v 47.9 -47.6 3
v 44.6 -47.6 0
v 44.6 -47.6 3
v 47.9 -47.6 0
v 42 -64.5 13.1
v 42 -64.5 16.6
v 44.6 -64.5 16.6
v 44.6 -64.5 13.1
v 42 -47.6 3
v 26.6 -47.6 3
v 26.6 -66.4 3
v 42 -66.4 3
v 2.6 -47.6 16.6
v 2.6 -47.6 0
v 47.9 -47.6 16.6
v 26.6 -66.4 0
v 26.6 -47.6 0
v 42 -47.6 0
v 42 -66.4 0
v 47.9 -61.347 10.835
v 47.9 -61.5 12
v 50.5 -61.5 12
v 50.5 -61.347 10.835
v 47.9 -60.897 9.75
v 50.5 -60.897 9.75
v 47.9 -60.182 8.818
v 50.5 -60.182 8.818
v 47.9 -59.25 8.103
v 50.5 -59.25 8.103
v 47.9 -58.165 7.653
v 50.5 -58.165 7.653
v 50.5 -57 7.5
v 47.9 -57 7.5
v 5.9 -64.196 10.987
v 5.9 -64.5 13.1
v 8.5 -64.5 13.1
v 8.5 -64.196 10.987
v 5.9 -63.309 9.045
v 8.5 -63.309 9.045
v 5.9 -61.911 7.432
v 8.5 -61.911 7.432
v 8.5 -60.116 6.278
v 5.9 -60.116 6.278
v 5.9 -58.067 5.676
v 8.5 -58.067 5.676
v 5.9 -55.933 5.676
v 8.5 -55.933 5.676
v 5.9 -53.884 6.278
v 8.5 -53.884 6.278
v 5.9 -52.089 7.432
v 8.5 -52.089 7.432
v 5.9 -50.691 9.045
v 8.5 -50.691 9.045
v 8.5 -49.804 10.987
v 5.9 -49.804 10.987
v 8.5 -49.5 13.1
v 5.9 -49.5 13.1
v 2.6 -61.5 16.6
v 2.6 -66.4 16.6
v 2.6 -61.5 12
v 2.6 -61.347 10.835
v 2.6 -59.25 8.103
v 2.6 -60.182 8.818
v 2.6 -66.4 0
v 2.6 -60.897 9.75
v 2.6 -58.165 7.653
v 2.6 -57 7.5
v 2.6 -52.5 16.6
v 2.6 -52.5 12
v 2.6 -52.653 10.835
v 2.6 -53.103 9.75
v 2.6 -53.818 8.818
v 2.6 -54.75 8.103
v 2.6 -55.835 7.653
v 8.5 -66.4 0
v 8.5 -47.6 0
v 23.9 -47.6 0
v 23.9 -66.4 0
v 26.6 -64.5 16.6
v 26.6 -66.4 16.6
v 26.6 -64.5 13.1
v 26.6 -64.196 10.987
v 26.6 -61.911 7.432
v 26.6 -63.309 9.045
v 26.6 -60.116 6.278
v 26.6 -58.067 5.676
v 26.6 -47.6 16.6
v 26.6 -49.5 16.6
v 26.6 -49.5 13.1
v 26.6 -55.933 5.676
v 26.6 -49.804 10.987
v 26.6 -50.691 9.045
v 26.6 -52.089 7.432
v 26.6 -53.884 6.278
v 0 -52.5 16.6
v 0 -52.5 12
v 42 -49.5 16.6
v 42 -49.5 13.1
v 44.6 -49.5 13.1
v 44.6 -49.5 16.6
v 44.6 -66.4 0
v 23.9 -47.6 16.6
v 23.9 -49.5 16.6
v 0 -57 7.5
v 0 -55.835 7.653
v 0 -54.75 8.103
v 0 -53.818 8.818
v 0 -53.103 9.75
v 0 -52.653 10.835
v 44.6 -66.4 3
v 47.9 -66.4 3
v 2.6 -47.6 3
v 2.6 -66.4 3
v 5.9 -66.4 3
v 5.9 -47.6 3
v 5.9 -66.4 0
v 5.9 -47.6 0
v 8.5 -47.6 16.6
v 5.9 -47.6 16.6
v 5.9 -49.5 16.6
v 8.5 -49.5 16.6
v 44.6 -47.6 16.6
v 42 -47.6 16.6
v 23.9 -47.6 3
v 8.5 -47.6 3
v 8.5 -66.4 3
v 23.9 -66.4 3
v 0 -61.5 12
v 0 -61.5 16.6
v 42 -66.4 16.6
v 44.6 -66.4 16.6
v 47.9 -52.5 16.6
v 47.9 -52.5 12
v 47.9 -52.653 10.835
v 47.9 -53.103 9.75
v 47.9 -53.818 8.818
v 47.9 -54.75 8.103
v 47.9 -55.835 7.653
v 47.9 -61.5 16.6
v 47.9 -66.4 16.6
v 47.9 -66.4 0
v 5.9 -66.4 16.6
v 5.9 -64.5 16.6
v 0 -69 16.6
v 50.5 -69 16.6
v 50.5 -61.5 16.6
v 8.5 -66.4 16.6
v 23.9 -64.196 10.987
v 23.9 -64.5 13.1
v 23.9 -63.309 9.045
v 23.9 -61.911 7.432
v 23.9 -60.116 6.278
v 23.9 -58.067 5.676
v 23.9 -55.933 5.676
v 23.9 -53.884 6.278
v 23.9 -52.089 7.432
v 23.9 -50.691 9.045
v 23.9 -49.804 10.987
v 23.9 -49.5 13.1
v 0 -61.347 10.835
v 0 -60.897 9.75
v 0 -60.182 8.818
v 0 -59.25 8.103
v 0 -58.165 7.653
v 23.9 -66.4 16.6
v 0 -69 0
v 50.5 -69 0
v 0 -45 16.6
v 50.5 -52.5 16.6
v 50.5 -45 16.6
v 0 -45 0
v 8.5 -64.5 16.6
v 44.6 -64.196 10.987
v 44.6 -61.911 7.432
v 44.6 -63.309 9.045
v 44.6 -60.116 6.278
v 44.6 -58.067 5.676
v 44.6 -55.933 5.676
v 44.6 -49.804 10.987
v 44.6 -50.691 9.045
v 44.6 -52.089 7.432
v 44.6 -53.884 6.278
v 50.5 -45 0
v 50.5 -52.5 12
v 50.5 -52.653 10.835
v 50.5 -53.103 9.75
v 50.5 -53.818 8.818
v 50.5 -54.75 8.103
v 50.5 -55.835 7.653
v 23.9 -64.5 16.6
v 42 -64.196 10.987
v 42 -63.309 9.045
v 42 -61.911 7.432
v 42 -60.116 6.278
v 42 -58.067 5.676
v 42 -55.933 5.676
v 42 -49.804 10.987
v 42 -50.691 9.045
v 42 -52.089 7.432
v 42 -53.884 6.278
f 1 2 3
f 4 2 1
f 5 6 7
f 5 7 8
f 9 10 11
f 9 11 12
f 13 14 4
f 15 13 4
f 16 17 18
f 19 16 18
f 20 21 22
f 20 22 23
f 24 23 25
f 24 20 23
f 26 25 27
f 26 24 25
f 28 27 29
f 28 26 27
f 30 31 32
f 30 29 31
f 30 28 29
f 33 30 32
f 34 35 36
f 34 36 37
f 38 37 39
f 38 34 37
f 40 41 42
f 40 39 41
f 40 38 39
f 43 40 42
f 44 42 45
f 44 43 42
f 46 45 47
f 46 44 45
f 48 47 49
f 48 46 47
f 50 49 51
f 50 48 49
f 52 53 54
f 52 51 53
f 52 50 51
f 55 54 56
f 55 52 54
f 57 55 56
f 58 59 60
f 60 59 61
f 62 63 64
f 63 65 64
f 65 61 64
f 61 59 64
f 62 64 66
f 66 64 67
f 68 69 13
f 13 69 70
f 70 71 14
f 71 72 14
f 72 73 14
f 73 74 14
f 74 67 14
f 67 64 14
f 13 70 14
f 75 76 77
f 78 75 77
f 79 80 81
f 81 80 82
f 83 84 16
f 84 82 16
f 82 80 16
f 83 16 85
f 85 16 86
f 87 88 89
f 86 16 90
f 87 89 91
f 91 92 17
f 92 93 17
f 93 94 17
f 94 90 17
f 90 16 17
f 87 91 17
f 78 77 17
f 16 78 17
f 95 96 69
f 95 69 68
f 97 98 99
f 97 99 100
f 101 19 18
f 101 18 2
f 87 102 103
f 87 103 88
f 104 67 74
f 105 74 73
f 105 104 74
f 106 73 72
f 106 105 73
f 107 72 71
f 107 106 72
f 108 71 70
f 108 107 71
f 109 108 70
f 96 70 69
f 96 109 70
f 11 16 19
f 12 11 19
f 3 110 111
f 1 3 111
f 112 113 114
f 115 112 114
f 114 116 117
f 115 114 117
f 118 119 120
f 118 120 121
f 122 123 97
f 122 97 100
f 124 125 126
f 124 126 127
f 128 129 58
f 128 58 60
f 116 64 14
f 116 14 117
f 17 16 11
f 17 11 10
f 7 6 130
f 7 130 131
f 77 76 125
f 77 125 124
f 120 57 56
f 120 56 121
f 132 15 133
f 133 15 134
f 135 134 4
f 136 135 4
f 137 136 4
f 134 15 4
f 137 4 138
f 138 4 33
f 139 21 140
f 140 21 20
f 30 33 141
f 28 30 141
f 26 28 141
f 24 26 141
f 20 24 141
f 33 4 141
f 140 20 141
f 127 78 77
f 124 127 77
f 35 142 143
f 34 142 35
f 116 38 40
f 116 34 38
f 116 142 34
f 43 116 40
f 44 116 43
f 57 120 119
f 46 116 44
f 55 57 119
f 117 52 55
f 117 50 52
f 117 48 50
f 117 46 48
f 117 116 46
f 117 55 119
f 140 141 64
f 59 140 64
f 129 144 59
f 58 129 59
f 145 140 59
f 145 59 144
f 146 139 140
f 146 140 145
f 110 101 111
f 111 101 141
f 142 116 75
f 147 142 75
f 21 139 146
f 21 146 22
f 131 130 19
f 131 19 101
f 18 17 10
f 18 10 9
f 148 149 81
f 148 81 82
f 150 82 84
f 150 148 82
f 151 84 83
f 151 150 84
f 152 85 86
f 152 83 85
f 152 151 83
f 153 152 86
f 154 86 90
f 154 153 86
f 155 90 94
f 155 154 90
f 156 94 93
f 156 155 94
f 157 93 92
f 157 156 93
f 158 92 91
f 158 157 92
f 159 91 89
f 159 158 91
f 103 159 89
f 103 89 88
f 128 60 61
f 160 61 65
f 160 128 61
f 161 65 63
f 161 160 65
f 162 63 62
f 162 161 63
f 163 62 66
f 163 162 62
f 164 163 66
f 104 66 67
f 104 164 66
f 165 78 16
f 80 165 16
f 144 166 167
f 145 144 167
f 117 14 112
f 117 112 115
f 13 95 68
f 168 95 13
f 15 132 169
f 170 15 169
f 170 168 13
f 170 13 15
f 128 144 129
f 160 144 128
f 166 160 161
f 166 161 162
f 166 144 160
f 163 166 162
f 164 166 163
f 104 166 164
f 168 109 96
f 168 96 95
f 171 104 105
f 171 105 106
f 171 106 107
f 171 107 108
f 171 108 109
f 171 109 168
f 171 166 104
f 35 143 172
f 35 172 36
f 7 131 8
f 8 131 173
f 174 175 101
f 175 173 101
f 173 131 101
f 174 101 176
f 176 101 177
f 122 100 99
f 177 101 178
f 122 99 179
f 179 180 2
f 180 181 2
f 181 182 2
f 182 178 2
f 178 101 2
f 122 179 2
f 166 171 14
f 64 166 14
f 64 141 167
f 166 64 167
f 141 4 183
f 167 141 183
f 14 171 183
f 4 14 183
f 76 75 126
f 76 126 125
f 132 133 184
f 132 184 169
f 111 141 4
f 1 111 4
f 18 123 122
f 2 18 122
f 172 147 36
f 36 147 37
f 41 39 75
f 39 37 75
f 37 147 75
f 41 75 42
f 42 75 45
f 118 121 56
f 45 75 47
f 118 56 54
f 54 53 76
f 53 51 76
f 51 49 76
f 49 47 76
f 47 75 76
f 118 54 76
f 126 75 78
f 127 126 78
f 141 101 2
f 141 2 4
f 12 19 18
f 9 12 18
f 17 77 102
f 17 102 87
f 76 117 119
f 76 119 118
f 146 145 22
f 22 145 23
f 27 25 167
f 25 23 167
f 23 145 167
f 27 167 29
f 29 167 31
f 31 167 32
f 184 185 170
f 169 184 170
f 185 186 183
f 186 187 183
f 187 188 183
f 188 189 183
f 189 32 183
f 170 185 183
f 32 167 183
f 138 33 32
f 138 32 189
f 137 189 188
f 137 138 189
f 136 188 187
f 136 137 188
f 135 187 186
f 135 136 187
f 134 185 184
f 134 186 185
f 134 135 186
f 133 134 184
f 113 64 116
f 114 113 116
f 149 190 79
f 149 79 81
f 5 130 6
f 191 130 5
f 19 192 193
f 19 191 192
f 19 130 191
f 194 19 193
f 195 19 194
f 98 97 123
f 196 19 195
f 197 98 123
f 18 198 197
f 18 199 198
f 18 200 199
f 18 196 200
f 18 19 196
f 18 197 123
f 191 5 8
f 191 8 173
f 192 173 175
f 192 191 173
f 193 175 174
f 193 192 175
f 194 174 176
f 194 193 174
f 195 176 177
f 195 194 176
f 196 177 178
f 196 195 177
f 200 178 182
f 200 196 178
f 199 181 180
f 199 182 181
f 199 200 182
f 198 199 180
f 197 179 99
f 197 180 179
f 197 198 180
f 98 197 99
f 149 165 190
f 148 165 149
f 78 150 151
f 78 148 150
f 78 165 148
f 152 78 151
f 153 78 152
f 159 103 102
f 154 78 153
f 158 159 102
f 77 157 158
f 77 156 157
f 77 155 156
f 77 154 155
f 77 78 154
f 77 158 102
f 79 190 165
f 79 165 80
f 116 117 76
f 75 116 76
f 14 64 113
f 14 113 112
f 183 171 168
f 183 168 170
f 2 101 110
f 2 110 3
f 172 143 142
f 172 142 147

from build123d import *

# Parameters (mm, degrees)
F0_W     = 3.3
F0_H     = 18.8
F1_DEPTH = 3
F0_W_2   = 15.4
F0_W_3   = 2.6
F2_DEPTH = 16.6
F0_W_4   = 2.7
F4_DEPTH = 47.901
F0_W_5   = 50.5
F0_H_2   = 24
F5_DEPTH = 16.6
F6_DEPTH = 50.501


with BuildPart() as f1:
    # F0 (on Top) → F1 (new body)
    with BuildSketch(Plane.XY):
        with Locations((4.25, -57)):
            Rectangle(F0_W, F0_H)
    extrude(amount=F1_DEPTH)


with BuildPart() as f1b:
    # F0 (on Top) → F1, piece 2 (new body)
    with BuildSketch(Plane.XY):
        with Locations((16.2, -57)):
            Rectangle(F0_W_2, F0_H)
    extrude(amount=F1_DEPTH)


with BuildPart() as f1c:
    # F0 (on Top) → F1, piece 3 (new body)
    with BuildSketch(Plane.XY):
        with Locations((34.3, -57)):
            Rectangle(F0_W_2, F0_H)
    extrude(amount=F1_DEPTH)


with BuildPart() as f1d:
    # F0 (on Top) → F1, piece 4 (new body)
    with BuildSketch(Plane.XY):
        with Locations((46.25, -57)):
            Rectangle(F0_W, F0_H)
    extrude(amount=F1_DEPTH)


with BuildPart() as f2:
    # F0 (on Top) → F2 (new body)
    with BuildSketch(Plane.XY):
        with Locations((43.3, -57)):
            Rectangle(F0_W_3, F0_H)
    extrude(amount=F2_DEPTH)


with BuildPart() as f2b:
    # F0 (on Top) → F2, piece 2 (new body)
    with BuildSketch(Plane.XY):
        with Locations((25.25, -57)):
            Rectangle(F0_W_4, F0_H)
    extrude(amount=F2_DEPTH)


with BuildPart() as f2c:
    # F0 (on Top) → F2, piece 3 (new body)
    with BuildSketch(Plane.XY):
        with Locations((7.2, -57)):
            Rectangle(F0_W_3, F0_H)
    extrude(amount=F2_DEPTH)


with BuildPart() as f4_tool:
    # F3 (on Right) → F4 (new body, through all)
    with BuildSketch(Plane.YZ):
        with BuildLine():
            Line((-64.5, 16.6), (-64.5, 13.1))
            ThreePointArc((-64.5, 13.1), (-64.2800883187, 14.9028627436), (-63.6332495807, 16.6))
            Line((-63.6332495807, 16.6), (-64.5, 16.6))
        make_face()
        with BuildLine():
            ThreePointArc((-64.5, 13.1), (-62.3033008589, 7.7966991411), (-57, 5.6))
            Line((-57, 5.6), (-57, 7.5))
            ThreePointArc((-57, 7.5), (-60.1819805153, 8.8180194847), (-61.5, 12))
            Line((-61.5, 12), (-61.5, 16.6))
            Line((-61.5, 16.6), (-63.6332495807, 16.6))
            ThreePointArc((-63.6332495807, 16.6), (-64.2800883187, 14.9028627436), (-64.5, 13.1))
        make_face()
        with BuildLine():
            Line((-57, 7.5), (-57, 5.6))
            ThreePointArc((-57, 5.6), (-51.6966991411, 7.7966991411), (-49.5, 13.1))
            ThreePointArc((-49.5, 13.1), (-49.7199116813, 14.9028627436), (-50.3667504193, 16.6))
            Line((-50.3667504193, 16.6), (-52.5, 16.6))
            Line((-52.5, 16.6), (-52.5, 12))
            ThreePointArc((-52.5, 12), (-53.8180194847, 8.8180194847), (-57, 7.5))
        make_face()
        with BuildLine():
            Line((-49.5, 13.1), (-49.5, 16.6))
            Line((-49.5, 16.6), (-50.3667504193, 16.6))
            ThreePointArc((-50.3667504193, 16.6), (-49.7199116813, 14.9028627436), (-49.5, 13.1))
        make_face()
        with BuildLine():
            ThreePointArc((-61.5, 12), (-60.1819805153, 15.1819805153), (-57, 16.5))
            Line((-57, 16.5), (-57, 16.6))
            Line((-57, 16.6), (-61.5, 16.6))
            Line((-61.5, 16.6), (-61.5, 12))
        make_face()
        with BuildLine():
            ThreePointArc((-61.5, 12), (-60.1819805153, 8.8180194847), (-57, 7.5))
            Line((-57, 7.5), (-57, 16.5))
            ThreePointArc((-57, 16.5), (-60.1819805153, 15.1819805153), (-61.5, 12))
        make_face()
        with BuildLine():
            Line((-57, 16.5), (-57, 7.5))
            ThreePointArc((-57, 7.5), (-53.8180194847, 8.8180194847), (-52.5, 12))
            ThreePointArc((-52.5, 12), (-53.8180194847, 15.1819805153), (-57, 16.5))
        make_face()
        with BuildLine():
            Line((-57, 16.6), (-57, 16.5))
            ThreePointArc((-57, 16.5), (-53.8180194847, 15.1819805153), (-52.5, 12))
            Line((-52.5, 12), (-52.5, 16.6))
            Line((-52.5, 16.6), (-57, 16.6))
        make_face()
    extrude(amount=F4_DEPTH)


with BuildPart() as f2_1:
    add(f2.part)

    # F4: cut by f4_tool
    add(f4_tool.part, mode=Mode.SUBTRACT)


with BuildPart() as f2b_1:
    add(f2b.part)

    # F4: cut by f4_tool
    add(f4_tool.part, mode=Mode.SUBTRACT)


with BuildPart() as f2c_1:
    add(f2c.part)

    # F4: cut by f4_tool
    add(f4_tool.part, mode=Mode.SUBTRACT)


with BuildPart() as f5:
    # F0 (on Top) → F5 (new body)
    with BuildSketch(Plane.XY):
        with Locations((25.25, -57)):
            Rectangle(F0_W_5, F0_H_2)
        Polygon((2.6, -66.4), (2.6, -47.6), (5.9, -47.6), (8.5, -47.6), (23.9, -47.6), (26.6, -47.6), (42, -47.6), (44.6, -47.6), (47.9, -47.6), (47.9, -66.4), (44.6, -66.4), (42, -66.4), (26.6, -66.4), (23.9, -66.4), (8.5, -66.4), (5.9, -66.4), align=None, mode=Mode.SUBTRACT)
    extrude(amount=F5_DEPTH)

    # F3 (on Right) → F6 (cut, through all)
    with BuildSketch(Plane.YZ):
        with BuildLine():
            ThreePointArc((-61.5, 12), (-60.1819805153, 15.1819805153), (-57, 16.5))
            Line((-57, 16.5), (-57, 16.6))
            Line((-57, 16.6), (-61.5, 16.6))
            Line((-61.5, 16.6), (-61.5, 12))
        make_face()
        with BuildLine():
            ThreePointArc((-61.5, 12), (-60.1819805153, 8.8180194847), (-57, 7.5))
            Line((-57, 7.5), (-57, 16.5))
            ThreePointArc((-57, 16.5), (-60.1819805153, 15.1819805153), (-61.5, 12))
        make_face()
        with BuildLine():
            Line((-57, 16.5), (-57, 7.5))
            ThreePointArc((-57, 7.5), (-53.8180194847, 8.8180194847), (-52.5, 12))
            ThreePointArc((-52.5, 12), (-53.8180194847, 15.1819805153), (-57, 16.5))
        make_face()
        with BuildLine():
            Line((-57, 16.6), (-57, 16.5))
            ThreePointArc((-57, 16.5), (-53.8180194847, 15.1819805153), (-52.5, 12))
            Line((-52.5, 12), (-52.5, 16.6))
            Line((-52.5, 16.6), (-57, 16.6))
        make_face()
    extrude(amount=F6_DEPTH, mode=Mode.SUBTRACT)


solid = Compound([f1.part, f1b.part, f1c.part, f1d.part, f2_1.part, f2b_1.part, f2c_1.part, f5.part])
